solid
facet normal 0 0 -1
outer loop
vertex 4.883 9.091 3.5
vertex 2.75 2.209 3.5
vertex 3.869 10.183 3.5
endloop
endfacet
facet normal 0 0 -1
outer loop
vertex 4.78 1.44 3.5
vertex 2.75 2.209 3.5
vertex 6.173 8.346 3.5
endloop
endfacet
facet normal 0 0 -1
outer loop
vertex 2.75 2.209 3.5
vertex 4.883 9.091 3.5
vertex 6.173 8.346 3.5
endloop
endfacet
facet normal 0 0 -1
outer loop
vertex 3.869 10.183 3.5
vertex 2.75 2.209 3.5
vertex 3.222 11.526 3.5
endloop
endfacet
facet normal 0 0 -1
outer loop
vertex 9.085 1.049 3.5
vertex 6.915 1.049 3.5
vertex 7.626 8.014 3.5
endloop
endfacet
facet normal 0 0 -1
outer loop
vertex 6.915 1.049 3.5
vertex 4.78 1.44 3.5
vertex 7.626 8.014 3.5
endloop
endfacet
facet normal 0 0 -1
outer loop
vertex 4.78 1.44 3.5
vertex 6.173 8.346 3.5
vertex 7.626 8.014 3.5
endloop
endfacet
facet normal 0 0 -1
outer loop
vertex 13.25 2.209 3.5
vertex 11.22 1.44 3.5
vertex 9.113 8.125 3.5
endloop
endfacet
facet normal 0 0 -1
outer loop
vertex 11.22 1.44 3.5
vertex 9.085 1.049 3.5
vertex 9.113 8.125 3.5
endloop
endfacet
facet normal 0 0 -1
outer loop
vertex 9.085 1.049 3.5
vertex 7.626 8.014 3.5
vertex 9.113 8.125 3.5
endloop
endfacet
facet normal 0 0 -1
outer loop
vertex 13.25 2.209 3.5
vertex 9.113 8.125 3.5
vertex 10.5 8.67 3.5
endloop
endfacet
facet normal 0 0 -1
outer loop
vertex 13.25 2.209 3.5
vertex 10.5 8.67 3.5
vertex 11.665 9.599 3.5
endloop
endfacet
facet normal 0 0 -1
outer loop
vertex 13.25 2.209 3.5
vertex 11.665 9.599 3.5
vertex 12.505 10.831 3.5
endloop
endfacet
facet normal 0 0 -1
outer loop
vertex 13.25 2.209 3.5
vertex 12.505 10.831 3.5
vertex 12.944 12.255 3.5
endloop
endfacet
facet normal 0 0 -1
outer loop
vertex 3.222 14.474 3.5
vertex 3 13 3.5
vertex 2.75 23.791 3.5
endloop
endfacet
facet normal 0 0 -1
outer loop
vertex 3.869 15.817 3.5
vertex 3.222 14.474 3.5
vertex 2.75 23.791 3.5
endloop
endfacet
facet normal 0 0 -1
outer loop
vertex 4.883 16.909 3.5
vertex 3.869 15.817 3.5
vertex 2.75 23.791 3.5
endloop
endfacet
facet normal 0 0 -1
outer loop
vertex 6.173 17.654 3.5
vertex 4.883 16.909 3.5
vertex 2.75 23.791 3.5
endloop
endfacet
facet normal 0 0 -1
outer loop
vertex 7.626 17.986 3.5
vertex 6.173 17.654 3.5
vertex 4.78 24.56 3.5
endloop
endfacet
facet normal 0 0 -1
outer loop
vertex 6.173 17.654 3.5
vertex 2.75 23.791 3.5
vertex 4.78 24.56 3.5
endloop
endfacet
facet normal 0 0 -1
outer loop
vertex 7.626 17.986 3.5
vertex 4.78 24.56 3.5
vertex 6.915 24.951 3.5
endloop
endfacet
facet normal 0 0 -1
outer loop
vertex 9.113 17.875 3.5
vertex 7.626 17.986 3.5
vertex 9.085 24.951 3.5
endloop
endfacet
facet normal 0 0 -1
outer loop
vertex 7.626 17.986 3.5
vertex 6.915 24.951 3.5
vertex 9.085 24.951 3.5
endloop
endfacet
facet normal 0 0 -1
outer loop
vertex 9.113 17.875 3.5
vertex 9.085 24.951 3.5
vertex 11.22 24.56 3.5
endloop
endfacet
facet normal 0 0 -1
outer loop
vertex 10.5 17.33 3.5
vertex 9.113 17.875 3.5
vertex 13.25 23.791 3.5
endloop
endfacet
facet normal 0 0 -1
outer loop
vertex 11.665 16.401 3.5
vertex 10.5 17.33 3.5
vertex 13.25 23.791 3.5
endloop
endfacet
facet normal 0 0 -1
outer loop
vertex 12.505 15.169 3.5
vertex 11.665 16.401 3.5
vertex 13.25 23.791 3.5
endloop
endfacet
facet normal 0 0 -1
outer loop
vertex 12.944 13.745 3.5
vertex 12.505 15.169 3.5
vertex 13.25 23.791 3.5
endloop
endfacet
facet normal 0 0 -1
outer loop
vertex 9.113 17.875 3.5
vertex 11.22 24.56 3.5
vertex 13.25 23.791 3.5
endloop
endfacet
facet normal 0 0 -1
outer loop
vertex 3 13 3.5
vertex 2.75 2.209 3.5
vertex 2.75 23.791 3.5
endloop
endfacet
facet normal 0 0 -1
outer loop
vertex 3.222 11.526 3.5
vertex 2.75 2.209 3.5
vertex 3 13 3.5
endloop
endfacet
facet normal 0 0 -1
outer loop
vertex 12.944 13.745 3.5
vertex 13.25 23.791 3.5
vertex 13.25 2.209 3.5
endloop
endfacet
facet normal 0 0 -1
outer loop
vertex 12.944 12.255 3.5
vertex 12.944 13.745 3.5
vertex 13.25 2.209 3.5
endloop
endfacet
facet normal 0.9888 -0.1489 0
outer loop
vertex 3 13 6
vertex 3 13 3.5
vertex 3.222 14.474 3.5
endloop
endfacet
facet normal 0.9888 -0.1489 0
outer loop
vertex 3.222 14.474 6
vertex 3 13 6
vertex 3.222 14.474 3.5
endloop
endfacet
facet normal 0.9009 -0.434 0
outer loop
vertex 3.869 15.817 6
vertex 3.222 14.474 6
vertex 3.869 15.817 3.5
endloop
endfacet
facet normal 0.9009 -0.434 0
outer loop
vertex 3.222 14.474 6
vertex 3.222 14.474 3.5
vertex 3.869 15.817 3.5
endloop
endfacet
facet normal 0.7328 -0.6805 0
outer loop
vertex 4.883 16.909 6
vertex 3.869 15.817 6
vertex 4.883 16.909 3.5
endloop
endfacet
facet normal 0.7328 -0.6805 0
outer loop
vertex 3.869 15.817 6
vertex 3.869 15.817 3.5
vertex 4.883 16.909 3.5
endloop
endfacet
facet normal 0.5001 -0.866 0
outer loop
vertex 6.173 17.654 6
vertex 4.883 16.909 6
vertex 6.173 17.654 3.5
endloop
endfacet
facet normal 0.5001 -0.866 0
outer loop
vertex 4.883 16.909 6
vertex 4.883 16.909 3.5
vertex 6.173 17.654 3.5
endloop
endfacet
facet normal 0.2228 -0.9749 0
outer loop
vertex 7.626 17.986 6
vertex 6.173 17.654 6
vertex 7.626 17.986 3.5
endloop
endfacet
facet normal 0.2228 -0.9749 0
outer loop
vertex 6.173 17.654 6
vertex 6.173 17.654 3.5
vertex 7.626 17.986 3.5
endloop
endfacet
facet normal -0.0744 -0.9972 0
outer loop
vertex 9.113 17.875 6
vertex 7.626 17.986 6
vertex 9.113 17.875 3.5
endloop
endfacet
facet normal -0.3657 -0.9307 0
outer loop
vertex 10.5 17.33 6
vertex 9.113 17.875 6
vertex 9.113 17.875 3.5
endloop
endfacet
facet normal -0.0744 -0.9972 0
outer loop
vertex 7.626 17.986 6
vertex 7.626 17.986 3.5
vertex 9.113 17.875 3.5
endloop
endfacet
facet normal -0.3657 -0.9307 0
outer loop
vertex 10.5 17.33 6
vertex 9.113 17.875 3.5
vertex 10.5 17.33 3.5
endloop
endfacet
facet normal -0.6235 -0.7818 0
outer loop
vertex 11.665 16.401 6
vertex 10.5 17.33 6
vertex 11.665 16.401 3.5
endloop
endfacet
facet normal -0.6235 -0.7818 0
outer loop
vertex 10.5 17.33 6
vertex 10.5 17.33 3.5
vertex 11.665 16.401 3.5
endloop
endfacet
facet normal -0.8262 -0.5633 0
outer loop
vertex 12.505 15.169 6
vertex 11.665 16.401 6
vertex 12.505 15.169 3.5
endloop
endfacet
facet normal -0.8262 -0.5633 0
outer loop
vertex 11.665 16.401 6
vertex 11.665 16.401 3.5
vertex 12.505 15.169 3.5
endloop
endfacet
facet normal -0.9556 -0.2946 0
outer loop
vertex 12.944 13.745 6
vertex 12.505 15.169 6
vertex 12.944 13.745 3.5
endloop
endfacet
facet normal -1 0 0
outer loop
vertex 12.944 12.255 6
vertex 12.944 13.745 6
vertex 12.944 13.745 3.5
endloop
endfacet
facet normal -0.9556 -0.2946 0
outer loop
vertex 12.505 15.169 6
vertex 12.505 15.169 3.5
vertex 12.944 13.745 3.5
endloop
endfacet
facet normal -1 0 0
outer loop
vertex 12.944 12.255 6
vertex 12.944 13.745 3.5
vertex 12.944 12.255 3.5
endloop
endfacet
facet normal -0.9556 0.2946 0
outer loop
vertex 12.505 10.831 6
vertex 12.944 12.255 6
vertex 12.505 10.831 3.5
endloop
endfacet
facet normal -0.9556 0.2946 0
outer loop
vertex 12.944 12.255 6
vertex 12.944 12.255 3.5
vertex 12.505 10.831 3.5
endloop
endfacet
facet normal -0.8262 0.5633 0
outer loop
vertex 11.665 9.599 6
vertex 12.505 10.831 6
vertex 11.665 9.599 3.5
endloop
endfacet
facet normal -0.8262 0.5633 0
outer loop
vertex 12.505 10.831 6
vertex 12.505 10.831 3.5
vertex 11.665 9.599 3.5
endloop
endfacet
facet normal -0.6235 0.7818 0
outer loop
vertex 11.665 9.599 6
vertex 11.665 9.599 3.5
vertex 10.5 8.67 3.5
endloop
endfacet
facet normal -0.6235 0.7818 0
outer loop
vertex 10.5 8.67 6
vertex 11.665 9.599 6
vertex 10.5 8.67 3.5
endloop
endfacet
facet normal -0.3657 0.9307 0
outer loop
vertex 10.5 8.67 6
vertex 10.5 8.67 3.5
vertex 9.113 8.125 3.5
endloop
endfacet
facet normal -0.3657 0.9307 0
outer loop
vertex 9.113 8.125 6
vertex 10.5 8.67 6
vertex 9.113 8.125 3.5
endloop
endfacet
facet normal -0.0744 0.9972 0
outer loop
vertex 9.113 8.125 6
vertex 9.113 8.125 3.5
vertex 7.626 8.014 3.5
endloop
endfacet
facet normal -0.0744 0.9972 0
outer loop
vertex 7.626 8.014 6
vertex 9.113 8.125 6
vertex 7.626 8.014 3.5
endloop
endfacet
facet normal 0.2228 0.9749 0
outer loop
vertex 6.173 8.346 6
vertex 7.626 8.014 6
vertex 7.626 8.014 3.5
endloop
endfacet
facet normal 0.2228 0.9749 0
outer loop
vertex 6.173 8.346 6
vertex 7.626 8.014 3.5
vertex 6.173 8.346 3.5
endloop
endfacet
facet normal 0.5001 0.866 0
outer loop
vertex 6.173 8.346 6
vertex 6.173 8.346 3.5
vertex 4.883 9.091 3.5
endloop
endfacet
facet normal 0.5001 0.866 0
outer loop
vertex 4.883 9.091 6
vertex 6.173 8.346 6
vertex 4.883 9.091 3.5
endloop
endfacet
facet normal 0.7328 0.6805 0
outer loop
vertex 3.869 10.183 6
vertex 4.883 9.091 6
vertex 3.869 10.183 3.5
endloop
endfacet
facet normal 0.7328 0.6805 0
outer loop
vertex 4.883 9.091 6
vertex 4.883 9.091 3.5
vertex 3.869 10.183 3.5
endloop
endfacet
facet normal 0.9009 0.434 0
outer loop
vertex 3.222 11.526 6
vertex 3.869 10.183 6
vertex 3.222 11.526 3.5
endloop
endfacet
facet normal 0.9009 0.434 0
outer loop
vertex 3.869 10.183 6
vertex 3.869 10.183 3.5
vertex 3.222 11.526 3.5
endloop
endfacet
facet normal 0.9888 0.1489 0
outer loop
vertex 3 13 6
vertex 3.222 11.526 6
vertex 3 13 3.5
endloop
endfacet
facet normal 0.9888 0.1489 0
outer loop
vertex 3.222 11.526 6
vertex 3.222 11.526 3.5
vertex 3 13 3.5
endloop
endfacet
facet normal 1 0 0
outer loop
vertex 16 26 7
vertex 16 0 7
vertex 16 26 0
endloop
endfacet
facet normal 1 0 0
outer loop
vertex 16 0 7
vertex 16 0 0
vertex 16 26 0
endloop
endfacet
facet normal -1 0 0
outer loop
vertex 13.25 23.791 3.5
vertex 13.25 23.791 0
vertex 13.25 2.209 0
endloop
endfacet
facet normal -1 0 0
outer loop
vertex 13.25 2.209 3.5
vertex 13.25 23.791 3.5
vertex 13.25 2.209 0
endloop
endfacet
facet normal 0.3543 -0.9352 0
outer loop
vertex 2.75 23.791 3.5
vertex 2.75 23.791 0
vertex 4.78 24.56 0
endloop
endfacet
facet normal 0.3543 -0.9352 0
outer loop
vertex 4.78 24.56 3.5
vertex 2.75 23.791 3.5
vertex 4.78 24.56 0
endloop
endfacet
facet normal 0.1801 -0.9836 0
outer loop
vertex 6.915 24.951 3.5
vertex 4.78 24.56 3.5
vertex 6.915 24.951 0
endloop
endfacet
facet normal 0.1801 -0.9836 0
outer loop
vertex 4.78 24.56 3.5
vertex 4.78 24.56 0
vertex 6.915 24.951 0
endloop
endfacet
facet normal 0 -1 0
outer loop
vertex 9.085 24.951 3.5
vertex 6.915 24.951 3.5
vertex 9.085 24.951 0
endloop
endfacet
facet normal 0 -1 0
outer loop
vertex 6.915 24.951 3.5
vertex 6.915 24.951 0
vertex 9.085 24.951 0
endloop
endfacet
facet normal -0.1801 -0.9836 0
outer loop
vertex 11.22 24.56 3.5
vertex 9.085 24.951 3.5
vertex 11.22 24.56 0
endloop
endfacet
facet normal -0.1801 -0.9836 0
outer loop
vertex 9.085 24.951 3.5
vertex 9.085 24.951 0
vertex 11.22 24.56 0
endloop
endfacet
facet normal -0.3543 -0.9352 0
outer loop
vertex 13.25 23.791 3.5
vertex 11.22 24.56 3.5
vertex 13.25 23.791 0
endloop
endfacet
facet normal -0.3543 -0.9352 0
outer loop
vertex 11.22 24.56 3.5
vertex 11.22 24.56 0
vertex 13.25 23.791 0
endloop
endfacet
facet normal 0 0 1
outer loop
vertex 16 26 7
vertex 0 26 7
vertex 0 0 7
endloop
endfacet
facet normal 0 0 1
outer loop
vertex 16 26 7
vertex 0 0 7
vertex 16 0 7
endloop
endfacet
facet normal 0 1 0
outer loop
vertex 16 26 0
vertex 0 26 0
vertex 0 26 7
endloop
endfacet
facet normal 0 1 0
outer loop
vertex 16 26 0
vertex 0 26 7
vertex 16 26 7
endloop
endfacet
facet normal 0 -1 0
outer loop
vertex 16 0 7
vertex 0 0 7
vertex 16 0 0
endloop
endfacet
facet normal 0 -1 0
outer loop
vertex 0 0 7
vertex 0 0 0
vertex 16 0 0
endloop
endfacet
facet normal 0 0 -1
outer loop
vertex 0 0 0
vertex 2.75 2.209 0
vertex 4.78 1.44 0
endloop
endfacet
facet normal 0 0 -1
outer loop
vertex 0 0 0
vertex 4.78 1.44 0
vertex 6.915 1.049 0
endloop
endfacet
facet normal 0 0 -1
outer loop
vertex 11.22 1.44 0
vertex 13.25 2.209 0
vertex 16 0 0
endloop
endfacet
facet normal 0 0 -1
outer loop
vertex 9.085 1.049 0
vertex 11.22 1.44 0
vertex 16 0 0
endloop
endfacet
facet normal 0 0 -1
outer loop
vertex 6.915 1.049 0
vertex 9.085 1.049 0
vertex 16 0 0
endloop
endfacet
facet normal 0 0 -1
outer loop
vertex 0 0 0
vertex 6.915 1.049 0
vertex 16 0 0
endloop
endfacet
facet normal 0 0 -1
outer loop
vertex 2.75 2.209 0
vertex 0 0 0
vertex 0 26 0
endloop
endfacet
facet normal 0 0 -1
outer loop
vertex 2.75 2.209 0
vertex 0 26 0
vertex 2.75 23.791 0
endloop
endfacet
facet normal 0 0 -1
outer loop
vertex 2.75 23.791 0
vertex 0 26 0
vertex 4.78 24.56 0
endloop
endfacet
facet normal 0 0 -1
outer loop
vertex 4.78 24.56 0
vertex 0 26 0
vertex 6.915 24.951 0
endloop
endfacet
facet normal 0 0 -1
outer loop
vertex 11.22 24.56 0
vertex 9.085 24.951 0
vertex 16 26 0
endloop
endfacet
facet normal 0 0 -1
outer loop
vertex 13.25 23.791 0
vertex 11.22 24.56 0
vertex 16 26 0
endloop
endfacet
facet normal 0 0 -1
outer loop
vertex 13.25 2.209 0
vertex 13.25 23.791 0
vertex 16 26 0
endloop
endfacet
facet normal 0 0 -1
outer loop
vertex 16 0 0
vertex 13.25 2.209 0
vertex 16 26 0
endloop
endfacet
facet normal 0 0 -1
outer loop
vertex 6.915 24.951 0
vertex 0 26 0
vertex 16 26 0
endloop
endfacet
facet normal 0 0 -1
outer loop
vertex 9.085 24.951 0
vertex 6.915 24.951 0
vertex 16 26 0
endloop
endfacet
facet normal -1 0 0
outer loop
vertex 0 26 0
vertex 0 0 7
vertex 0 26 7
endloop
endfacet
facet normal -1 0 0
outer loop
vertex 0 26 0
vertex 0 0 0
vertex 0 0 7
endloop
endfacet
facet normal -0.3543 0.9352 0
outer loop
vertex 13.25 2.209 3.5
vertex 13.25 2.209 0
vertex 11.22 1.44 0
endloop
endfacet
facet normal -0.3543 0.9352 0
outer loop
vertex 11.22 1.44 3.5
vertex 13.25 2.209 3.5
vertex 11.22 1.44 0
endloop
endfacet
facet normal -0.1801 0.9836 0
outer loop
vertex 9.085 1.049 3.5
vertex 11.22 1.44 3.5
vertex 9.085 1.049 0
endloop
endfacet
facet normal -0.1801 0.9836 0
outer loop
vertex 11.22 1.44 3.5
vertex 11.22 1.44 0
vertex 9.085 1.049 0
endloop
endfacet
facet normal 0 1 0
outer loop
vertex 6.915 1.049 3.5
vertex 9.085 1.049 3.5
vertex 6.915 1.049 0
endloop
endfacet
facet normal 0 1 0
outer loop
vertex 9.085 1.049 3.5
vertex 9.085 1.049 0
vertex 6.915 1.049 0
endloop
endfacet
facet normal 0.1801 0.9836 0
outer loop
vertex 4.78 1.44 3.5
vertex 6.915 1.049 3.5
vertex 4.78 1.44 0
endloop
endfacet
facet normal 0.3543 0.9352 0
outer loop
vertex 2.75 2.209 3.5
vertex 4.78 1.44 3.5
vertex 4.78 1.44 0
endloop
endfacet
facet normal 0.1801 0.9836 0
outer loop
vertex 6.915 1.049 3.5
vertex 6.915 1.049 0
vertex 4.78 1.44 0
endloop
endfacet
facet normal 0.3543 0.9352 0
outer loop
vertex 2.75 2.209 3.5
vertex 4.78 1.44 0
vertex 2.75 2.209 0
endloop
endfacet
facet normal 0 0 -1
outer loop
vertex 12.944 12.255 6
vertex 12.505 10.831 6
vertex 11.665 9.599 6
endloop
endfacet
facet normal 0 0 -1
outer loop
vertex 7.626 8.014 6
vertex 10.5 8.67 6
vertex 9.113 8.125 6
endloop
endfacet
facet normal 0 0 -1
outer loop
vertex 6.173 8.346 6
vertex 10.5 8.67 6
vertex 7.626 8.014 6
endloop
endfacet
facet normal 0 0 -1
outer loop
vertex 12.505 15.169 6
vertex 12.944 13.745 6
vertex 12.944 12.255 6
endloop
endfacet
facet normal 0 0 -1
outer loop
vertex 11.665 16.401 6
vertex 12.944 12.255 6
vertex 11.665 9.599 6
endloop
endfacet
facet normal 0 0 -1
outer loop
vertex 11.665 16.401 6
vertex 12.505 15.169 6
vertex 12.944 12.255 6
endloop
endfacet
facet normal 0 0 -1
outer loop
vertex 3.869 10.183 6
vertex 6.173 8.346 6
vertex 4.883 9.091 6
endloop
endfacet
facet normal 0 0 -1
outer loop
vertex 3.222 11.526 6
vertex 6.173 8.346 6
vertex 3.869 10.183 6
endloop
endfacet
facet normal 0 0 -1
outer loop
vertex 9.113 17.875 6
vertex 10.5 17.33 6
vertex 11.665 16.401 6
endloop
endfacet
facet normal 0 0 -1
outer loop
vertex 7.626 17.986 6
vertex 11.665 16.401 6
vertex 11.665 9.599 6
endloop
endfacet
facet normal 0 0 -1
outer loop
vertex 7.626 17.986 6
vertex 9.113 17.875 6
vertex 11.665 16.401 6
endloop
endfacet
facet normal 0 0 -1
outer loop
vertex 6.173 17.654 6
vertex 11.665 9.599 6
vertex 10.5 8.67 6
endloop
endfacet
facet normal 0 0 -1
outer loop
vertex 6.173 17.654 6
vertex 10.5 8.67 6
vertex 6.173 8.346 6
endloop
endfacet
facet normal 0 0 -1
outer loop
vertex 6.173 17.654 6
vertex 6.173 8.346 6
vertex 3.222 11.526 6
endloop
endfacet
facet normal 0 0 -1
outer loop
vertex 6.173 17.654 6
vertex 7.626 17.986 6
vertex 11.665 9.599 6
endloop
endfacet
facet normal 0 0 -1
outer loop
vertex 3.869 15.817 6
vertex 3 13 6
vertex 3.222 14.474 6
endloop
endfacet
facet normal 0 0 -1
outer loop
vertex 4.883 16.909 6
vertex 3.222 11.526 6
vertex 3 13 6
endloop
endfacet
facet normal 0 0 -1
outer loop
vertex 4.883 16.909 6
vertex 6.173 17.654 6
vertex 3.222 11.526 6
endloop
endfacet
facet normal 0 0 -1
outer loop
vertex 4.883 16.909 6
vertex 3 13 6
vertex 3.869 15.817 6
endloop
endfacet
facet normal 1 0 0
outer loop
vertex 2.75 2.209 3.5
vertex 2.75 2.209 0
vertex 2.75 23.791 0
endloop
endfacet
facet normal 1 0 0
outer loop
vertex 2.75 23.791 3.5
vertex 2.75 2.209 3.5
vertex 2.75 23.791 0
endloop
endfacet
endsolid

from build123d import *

# Parameters (mm, degrees)
SKETCH1_W           = 16
SKETCH1_H           = 26
BOSS_EXTRUDE1_DEPTH = 3.5
SKETCH2_W           = 16
SKETCH2_H           = 26
BOSS_EXTRUDE2_DEPTH = 3.5
SKETCH3_R           = 5
CUT_EXTRUDE1_DEPTH  = 2.5


with BuildPart() as part:
    # Sketch1 → Boss-Extrude1 (new body)
    with BuildSketch(Plane.XY):
        with Locations((8, 13)):
            Rectangle(SKETCH1_W, SKETCH1_H)
        with BuildLine():
            Line((13.25, 23.790620927), (13.25, 2.209379073))
            ThreePointArc((13.25, 2.209379073), (8, 1), (2.75, 2.209379073))
            Line((2.75, 2.209379073), (2.75, 23.790620927))
            ThreePointArc((2.75, 23.790620927), (8, 25), (13.25, 23.790620927))
        make_face(mode=Mode.SUBTRACT)
    extrude(amount=BOSS_EXTRUDE1_DEPTH)

    # Sketch2 → Boss-Extrude2 (add)
    with BuildSketch(Plane.XY.offset(3.5)):
        with Locations((8, 13)):
            Rectangle(SKETCH2_W, SKETCH2_H)
    extrude(amount=BOSS_EXTRUDE2_DEPTH)

    # Sketch3 → Cut-Extrude1 (cut)
    with BuildSketch(Plane(origin=(0, 0, 3.5), x_dir=(-1, 0, 0), z_dir=(0, 0, -1))):
        with Locations((-8, 13)):
            Circle(SKETCH3_R)
    extrude(amount=-CUT_EXTRUDE1_DEPTH, mode=Mode.SUBTRACT)


solid = part.part
